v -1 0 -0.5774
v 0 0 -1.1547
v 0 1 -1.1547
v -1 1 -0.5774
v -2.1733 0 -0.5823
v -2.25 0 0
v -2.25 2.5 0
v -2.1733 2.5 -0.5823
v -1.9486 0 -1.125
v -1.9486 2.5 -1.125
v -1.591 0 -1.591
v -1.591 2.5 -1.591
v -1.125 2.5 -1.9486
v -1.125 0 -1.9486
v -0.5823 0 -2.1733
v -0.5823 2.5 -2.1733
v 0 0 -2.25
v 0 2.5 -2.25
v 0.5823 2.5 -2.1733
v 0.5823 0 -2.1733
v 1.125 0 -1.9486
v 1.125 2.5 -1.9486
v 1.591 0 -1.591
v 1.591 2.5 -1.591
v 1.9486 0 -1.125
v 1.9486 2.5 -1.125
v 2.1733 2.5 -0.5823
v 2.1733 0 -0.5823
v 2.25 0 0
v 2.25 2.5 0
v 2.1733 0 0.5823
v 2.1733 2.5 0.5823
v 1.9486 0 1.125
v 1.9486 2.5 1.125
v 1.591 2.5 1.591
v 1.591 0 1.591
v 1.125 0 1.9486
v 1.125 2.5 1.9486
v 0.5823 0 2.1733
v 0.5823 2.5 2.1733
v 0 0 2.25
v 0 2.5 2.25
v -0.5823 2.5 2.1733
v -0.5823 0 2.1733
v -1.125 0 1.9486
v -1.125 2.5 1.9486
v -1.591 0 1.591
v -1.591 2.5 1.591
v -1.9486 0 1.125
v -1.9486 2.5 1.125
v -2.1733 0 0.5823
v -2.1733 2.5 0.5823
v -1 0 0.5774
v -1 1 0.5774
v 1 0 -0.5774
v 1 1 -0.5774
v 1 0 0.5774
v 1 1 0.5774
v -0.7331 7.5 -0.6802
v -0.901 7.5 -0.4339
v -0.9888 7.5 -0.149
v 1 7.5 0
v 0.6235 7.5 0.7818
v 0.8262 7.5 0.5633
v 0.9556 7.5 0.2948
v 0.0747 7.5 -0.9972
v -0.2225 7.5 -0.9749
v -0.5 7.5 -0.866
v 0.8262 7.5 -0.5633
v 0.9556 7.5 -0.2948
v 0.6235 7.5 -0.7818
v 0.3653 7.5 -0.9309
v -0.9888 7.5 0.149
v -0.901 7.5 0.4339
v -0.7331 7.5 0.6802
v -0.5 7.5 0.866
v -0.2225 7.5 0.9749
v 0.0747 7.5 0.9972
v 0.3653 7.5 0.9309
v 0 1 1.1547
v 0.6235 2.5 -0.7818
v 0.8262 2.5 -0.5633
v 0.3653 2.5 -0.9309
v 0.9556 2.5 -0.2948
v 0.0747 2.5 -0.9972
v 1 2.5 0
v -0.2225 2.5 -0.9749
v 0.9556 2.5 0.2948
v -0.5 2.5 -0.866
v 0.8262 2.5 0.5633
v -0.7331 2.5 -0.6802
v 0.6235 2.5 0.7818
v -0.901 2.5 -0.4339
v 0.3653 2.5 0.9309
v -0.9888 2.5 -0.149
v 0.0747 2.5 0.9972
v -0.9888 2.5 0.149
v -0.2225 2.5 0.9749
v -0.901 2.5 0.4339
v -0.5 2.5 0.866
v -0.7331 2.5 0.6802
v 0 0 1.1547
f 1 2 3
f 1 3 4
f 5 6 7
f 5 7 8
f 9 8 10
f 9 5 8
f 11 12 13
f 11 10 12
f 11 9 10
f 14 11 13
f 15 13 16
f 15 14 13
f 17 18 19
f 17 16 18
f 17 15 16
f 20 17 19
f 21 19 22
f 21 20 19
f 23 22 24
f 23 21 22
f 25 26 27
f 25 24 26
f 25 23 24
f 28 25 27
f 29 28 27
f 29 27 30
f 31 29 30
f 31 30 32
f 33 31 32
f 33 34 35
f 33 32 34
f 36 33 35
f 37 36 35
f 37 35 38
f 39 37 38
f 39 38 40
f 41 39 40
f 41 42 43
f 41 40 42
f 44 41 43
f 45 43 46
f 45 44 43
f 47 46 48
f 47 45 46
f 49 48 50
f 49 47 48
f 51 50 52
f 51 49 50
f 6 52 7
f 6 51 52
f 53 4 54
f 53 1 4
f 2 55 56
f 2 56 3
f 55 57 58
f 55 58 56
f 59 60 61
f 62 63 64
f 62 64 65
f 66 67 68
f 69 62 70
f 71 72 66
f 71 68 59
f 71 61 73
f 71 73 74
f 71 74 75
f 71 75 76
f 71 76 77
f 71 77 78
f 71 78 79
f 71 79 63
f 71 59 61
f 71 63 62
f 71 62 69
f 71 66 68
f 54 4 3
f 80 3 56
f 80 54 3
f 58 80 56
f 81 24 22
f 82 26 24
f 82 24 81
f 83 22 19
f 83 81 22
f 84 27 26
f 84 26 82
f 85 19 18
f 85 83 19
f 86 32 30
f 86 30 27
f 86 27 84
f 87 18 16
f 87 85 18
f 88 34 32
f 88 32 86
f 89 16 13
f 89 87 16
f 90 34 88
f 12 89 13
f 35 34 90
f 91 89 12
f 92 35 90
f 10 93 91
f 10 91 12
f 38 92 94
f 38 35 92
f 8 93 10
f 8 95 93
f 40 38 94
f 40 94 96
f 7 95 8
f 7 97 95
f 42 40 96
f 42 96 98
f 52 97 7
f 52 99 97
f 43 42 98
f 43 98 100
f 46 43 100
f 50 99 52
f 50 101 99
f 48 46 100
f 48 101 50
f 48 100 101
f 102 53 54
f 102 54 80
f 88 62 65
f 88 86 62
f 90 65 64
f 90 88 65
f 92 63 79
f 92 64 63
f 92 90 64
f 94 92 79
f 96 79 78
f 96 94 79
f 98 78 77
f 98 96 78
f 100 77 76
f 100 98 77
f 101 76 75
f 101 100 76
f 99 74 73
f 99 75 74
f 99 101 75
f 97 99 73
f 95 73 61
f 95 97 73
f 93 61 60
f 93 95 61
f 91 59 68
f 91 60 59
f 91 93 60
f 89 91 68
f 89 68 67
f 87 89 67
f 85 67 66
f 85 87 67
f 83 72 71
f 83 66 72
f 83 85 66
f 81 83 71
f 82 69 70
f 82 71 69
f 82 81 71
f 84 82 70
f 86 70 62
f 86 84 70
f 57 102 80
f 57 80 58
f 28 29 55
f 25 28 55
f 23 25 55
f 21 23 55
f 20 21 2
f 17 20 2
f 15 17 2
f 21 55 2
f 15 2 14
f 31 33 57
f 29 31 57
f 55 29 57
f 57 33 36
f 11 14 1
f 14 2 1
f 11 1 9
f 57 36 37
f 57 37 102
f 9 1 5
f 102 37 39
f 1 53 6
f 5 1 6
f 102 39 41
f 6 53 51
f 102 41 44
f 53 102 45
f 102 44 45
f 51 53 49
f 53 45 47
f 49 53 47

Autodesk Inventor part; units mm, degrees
ref_plane "YZ Plane" through (0, 0, 0) normal (1, 0, 0) x (0, 1, 0)
ref_plane "XZ Plane" through (0, 0, 0) normal (0, 1, 0) x (-1, 0, 0)
ref_plane "XY Plane" through (0, 0, 0) normal (0, 0, 1) x (1, 0, 0)
sketch "Sketch1" plane through (0, 0, 0) normal (0, 1, 0) x (-1, 0, 0)
  circle A0 centre (0, 0) radius 2.25
  dimension "d0" = 4.5
extrude "Extrusion1" add sketch "Sketch1" along normal blind 2.5
sketch "Sketch2" plane through (0, 2.5, 0) normal (0, 1, 0) x (1, 0, 0)
  circle A0 centre (0, 0) radius 1
  dimension "d3" = 2
extrude "Extrusion2" add sketch "Sketch2" along normal blind 5
sketch "Sketch3" plane through (0, 0, 0) normal (0, -1, 0) x (1, 0, 0)
  line L0 (0, -1.1547) -> (-1, -0.5774)
  line L1 (-1, -0.5774) -> (-1, 0.5774)
  line L2 (-1, 0.5774) -> (0, 1.1547)
  line L3 (0, 1.1547) -> (1, 0.5774)
  line L4 (1, 0.5774) -> (1, -0.5774)
  line L5 (1, -0.5774) -> (0, -1.1547)
  point P0 (0, 0)
  point P1 (0, 0)
  dimension "d6" = 2
extrude "Extrusion3" cut sketch "Sketch3" against normal blind 1
properties part number "m2_bolt_5mm" material "Stainless Steel"
